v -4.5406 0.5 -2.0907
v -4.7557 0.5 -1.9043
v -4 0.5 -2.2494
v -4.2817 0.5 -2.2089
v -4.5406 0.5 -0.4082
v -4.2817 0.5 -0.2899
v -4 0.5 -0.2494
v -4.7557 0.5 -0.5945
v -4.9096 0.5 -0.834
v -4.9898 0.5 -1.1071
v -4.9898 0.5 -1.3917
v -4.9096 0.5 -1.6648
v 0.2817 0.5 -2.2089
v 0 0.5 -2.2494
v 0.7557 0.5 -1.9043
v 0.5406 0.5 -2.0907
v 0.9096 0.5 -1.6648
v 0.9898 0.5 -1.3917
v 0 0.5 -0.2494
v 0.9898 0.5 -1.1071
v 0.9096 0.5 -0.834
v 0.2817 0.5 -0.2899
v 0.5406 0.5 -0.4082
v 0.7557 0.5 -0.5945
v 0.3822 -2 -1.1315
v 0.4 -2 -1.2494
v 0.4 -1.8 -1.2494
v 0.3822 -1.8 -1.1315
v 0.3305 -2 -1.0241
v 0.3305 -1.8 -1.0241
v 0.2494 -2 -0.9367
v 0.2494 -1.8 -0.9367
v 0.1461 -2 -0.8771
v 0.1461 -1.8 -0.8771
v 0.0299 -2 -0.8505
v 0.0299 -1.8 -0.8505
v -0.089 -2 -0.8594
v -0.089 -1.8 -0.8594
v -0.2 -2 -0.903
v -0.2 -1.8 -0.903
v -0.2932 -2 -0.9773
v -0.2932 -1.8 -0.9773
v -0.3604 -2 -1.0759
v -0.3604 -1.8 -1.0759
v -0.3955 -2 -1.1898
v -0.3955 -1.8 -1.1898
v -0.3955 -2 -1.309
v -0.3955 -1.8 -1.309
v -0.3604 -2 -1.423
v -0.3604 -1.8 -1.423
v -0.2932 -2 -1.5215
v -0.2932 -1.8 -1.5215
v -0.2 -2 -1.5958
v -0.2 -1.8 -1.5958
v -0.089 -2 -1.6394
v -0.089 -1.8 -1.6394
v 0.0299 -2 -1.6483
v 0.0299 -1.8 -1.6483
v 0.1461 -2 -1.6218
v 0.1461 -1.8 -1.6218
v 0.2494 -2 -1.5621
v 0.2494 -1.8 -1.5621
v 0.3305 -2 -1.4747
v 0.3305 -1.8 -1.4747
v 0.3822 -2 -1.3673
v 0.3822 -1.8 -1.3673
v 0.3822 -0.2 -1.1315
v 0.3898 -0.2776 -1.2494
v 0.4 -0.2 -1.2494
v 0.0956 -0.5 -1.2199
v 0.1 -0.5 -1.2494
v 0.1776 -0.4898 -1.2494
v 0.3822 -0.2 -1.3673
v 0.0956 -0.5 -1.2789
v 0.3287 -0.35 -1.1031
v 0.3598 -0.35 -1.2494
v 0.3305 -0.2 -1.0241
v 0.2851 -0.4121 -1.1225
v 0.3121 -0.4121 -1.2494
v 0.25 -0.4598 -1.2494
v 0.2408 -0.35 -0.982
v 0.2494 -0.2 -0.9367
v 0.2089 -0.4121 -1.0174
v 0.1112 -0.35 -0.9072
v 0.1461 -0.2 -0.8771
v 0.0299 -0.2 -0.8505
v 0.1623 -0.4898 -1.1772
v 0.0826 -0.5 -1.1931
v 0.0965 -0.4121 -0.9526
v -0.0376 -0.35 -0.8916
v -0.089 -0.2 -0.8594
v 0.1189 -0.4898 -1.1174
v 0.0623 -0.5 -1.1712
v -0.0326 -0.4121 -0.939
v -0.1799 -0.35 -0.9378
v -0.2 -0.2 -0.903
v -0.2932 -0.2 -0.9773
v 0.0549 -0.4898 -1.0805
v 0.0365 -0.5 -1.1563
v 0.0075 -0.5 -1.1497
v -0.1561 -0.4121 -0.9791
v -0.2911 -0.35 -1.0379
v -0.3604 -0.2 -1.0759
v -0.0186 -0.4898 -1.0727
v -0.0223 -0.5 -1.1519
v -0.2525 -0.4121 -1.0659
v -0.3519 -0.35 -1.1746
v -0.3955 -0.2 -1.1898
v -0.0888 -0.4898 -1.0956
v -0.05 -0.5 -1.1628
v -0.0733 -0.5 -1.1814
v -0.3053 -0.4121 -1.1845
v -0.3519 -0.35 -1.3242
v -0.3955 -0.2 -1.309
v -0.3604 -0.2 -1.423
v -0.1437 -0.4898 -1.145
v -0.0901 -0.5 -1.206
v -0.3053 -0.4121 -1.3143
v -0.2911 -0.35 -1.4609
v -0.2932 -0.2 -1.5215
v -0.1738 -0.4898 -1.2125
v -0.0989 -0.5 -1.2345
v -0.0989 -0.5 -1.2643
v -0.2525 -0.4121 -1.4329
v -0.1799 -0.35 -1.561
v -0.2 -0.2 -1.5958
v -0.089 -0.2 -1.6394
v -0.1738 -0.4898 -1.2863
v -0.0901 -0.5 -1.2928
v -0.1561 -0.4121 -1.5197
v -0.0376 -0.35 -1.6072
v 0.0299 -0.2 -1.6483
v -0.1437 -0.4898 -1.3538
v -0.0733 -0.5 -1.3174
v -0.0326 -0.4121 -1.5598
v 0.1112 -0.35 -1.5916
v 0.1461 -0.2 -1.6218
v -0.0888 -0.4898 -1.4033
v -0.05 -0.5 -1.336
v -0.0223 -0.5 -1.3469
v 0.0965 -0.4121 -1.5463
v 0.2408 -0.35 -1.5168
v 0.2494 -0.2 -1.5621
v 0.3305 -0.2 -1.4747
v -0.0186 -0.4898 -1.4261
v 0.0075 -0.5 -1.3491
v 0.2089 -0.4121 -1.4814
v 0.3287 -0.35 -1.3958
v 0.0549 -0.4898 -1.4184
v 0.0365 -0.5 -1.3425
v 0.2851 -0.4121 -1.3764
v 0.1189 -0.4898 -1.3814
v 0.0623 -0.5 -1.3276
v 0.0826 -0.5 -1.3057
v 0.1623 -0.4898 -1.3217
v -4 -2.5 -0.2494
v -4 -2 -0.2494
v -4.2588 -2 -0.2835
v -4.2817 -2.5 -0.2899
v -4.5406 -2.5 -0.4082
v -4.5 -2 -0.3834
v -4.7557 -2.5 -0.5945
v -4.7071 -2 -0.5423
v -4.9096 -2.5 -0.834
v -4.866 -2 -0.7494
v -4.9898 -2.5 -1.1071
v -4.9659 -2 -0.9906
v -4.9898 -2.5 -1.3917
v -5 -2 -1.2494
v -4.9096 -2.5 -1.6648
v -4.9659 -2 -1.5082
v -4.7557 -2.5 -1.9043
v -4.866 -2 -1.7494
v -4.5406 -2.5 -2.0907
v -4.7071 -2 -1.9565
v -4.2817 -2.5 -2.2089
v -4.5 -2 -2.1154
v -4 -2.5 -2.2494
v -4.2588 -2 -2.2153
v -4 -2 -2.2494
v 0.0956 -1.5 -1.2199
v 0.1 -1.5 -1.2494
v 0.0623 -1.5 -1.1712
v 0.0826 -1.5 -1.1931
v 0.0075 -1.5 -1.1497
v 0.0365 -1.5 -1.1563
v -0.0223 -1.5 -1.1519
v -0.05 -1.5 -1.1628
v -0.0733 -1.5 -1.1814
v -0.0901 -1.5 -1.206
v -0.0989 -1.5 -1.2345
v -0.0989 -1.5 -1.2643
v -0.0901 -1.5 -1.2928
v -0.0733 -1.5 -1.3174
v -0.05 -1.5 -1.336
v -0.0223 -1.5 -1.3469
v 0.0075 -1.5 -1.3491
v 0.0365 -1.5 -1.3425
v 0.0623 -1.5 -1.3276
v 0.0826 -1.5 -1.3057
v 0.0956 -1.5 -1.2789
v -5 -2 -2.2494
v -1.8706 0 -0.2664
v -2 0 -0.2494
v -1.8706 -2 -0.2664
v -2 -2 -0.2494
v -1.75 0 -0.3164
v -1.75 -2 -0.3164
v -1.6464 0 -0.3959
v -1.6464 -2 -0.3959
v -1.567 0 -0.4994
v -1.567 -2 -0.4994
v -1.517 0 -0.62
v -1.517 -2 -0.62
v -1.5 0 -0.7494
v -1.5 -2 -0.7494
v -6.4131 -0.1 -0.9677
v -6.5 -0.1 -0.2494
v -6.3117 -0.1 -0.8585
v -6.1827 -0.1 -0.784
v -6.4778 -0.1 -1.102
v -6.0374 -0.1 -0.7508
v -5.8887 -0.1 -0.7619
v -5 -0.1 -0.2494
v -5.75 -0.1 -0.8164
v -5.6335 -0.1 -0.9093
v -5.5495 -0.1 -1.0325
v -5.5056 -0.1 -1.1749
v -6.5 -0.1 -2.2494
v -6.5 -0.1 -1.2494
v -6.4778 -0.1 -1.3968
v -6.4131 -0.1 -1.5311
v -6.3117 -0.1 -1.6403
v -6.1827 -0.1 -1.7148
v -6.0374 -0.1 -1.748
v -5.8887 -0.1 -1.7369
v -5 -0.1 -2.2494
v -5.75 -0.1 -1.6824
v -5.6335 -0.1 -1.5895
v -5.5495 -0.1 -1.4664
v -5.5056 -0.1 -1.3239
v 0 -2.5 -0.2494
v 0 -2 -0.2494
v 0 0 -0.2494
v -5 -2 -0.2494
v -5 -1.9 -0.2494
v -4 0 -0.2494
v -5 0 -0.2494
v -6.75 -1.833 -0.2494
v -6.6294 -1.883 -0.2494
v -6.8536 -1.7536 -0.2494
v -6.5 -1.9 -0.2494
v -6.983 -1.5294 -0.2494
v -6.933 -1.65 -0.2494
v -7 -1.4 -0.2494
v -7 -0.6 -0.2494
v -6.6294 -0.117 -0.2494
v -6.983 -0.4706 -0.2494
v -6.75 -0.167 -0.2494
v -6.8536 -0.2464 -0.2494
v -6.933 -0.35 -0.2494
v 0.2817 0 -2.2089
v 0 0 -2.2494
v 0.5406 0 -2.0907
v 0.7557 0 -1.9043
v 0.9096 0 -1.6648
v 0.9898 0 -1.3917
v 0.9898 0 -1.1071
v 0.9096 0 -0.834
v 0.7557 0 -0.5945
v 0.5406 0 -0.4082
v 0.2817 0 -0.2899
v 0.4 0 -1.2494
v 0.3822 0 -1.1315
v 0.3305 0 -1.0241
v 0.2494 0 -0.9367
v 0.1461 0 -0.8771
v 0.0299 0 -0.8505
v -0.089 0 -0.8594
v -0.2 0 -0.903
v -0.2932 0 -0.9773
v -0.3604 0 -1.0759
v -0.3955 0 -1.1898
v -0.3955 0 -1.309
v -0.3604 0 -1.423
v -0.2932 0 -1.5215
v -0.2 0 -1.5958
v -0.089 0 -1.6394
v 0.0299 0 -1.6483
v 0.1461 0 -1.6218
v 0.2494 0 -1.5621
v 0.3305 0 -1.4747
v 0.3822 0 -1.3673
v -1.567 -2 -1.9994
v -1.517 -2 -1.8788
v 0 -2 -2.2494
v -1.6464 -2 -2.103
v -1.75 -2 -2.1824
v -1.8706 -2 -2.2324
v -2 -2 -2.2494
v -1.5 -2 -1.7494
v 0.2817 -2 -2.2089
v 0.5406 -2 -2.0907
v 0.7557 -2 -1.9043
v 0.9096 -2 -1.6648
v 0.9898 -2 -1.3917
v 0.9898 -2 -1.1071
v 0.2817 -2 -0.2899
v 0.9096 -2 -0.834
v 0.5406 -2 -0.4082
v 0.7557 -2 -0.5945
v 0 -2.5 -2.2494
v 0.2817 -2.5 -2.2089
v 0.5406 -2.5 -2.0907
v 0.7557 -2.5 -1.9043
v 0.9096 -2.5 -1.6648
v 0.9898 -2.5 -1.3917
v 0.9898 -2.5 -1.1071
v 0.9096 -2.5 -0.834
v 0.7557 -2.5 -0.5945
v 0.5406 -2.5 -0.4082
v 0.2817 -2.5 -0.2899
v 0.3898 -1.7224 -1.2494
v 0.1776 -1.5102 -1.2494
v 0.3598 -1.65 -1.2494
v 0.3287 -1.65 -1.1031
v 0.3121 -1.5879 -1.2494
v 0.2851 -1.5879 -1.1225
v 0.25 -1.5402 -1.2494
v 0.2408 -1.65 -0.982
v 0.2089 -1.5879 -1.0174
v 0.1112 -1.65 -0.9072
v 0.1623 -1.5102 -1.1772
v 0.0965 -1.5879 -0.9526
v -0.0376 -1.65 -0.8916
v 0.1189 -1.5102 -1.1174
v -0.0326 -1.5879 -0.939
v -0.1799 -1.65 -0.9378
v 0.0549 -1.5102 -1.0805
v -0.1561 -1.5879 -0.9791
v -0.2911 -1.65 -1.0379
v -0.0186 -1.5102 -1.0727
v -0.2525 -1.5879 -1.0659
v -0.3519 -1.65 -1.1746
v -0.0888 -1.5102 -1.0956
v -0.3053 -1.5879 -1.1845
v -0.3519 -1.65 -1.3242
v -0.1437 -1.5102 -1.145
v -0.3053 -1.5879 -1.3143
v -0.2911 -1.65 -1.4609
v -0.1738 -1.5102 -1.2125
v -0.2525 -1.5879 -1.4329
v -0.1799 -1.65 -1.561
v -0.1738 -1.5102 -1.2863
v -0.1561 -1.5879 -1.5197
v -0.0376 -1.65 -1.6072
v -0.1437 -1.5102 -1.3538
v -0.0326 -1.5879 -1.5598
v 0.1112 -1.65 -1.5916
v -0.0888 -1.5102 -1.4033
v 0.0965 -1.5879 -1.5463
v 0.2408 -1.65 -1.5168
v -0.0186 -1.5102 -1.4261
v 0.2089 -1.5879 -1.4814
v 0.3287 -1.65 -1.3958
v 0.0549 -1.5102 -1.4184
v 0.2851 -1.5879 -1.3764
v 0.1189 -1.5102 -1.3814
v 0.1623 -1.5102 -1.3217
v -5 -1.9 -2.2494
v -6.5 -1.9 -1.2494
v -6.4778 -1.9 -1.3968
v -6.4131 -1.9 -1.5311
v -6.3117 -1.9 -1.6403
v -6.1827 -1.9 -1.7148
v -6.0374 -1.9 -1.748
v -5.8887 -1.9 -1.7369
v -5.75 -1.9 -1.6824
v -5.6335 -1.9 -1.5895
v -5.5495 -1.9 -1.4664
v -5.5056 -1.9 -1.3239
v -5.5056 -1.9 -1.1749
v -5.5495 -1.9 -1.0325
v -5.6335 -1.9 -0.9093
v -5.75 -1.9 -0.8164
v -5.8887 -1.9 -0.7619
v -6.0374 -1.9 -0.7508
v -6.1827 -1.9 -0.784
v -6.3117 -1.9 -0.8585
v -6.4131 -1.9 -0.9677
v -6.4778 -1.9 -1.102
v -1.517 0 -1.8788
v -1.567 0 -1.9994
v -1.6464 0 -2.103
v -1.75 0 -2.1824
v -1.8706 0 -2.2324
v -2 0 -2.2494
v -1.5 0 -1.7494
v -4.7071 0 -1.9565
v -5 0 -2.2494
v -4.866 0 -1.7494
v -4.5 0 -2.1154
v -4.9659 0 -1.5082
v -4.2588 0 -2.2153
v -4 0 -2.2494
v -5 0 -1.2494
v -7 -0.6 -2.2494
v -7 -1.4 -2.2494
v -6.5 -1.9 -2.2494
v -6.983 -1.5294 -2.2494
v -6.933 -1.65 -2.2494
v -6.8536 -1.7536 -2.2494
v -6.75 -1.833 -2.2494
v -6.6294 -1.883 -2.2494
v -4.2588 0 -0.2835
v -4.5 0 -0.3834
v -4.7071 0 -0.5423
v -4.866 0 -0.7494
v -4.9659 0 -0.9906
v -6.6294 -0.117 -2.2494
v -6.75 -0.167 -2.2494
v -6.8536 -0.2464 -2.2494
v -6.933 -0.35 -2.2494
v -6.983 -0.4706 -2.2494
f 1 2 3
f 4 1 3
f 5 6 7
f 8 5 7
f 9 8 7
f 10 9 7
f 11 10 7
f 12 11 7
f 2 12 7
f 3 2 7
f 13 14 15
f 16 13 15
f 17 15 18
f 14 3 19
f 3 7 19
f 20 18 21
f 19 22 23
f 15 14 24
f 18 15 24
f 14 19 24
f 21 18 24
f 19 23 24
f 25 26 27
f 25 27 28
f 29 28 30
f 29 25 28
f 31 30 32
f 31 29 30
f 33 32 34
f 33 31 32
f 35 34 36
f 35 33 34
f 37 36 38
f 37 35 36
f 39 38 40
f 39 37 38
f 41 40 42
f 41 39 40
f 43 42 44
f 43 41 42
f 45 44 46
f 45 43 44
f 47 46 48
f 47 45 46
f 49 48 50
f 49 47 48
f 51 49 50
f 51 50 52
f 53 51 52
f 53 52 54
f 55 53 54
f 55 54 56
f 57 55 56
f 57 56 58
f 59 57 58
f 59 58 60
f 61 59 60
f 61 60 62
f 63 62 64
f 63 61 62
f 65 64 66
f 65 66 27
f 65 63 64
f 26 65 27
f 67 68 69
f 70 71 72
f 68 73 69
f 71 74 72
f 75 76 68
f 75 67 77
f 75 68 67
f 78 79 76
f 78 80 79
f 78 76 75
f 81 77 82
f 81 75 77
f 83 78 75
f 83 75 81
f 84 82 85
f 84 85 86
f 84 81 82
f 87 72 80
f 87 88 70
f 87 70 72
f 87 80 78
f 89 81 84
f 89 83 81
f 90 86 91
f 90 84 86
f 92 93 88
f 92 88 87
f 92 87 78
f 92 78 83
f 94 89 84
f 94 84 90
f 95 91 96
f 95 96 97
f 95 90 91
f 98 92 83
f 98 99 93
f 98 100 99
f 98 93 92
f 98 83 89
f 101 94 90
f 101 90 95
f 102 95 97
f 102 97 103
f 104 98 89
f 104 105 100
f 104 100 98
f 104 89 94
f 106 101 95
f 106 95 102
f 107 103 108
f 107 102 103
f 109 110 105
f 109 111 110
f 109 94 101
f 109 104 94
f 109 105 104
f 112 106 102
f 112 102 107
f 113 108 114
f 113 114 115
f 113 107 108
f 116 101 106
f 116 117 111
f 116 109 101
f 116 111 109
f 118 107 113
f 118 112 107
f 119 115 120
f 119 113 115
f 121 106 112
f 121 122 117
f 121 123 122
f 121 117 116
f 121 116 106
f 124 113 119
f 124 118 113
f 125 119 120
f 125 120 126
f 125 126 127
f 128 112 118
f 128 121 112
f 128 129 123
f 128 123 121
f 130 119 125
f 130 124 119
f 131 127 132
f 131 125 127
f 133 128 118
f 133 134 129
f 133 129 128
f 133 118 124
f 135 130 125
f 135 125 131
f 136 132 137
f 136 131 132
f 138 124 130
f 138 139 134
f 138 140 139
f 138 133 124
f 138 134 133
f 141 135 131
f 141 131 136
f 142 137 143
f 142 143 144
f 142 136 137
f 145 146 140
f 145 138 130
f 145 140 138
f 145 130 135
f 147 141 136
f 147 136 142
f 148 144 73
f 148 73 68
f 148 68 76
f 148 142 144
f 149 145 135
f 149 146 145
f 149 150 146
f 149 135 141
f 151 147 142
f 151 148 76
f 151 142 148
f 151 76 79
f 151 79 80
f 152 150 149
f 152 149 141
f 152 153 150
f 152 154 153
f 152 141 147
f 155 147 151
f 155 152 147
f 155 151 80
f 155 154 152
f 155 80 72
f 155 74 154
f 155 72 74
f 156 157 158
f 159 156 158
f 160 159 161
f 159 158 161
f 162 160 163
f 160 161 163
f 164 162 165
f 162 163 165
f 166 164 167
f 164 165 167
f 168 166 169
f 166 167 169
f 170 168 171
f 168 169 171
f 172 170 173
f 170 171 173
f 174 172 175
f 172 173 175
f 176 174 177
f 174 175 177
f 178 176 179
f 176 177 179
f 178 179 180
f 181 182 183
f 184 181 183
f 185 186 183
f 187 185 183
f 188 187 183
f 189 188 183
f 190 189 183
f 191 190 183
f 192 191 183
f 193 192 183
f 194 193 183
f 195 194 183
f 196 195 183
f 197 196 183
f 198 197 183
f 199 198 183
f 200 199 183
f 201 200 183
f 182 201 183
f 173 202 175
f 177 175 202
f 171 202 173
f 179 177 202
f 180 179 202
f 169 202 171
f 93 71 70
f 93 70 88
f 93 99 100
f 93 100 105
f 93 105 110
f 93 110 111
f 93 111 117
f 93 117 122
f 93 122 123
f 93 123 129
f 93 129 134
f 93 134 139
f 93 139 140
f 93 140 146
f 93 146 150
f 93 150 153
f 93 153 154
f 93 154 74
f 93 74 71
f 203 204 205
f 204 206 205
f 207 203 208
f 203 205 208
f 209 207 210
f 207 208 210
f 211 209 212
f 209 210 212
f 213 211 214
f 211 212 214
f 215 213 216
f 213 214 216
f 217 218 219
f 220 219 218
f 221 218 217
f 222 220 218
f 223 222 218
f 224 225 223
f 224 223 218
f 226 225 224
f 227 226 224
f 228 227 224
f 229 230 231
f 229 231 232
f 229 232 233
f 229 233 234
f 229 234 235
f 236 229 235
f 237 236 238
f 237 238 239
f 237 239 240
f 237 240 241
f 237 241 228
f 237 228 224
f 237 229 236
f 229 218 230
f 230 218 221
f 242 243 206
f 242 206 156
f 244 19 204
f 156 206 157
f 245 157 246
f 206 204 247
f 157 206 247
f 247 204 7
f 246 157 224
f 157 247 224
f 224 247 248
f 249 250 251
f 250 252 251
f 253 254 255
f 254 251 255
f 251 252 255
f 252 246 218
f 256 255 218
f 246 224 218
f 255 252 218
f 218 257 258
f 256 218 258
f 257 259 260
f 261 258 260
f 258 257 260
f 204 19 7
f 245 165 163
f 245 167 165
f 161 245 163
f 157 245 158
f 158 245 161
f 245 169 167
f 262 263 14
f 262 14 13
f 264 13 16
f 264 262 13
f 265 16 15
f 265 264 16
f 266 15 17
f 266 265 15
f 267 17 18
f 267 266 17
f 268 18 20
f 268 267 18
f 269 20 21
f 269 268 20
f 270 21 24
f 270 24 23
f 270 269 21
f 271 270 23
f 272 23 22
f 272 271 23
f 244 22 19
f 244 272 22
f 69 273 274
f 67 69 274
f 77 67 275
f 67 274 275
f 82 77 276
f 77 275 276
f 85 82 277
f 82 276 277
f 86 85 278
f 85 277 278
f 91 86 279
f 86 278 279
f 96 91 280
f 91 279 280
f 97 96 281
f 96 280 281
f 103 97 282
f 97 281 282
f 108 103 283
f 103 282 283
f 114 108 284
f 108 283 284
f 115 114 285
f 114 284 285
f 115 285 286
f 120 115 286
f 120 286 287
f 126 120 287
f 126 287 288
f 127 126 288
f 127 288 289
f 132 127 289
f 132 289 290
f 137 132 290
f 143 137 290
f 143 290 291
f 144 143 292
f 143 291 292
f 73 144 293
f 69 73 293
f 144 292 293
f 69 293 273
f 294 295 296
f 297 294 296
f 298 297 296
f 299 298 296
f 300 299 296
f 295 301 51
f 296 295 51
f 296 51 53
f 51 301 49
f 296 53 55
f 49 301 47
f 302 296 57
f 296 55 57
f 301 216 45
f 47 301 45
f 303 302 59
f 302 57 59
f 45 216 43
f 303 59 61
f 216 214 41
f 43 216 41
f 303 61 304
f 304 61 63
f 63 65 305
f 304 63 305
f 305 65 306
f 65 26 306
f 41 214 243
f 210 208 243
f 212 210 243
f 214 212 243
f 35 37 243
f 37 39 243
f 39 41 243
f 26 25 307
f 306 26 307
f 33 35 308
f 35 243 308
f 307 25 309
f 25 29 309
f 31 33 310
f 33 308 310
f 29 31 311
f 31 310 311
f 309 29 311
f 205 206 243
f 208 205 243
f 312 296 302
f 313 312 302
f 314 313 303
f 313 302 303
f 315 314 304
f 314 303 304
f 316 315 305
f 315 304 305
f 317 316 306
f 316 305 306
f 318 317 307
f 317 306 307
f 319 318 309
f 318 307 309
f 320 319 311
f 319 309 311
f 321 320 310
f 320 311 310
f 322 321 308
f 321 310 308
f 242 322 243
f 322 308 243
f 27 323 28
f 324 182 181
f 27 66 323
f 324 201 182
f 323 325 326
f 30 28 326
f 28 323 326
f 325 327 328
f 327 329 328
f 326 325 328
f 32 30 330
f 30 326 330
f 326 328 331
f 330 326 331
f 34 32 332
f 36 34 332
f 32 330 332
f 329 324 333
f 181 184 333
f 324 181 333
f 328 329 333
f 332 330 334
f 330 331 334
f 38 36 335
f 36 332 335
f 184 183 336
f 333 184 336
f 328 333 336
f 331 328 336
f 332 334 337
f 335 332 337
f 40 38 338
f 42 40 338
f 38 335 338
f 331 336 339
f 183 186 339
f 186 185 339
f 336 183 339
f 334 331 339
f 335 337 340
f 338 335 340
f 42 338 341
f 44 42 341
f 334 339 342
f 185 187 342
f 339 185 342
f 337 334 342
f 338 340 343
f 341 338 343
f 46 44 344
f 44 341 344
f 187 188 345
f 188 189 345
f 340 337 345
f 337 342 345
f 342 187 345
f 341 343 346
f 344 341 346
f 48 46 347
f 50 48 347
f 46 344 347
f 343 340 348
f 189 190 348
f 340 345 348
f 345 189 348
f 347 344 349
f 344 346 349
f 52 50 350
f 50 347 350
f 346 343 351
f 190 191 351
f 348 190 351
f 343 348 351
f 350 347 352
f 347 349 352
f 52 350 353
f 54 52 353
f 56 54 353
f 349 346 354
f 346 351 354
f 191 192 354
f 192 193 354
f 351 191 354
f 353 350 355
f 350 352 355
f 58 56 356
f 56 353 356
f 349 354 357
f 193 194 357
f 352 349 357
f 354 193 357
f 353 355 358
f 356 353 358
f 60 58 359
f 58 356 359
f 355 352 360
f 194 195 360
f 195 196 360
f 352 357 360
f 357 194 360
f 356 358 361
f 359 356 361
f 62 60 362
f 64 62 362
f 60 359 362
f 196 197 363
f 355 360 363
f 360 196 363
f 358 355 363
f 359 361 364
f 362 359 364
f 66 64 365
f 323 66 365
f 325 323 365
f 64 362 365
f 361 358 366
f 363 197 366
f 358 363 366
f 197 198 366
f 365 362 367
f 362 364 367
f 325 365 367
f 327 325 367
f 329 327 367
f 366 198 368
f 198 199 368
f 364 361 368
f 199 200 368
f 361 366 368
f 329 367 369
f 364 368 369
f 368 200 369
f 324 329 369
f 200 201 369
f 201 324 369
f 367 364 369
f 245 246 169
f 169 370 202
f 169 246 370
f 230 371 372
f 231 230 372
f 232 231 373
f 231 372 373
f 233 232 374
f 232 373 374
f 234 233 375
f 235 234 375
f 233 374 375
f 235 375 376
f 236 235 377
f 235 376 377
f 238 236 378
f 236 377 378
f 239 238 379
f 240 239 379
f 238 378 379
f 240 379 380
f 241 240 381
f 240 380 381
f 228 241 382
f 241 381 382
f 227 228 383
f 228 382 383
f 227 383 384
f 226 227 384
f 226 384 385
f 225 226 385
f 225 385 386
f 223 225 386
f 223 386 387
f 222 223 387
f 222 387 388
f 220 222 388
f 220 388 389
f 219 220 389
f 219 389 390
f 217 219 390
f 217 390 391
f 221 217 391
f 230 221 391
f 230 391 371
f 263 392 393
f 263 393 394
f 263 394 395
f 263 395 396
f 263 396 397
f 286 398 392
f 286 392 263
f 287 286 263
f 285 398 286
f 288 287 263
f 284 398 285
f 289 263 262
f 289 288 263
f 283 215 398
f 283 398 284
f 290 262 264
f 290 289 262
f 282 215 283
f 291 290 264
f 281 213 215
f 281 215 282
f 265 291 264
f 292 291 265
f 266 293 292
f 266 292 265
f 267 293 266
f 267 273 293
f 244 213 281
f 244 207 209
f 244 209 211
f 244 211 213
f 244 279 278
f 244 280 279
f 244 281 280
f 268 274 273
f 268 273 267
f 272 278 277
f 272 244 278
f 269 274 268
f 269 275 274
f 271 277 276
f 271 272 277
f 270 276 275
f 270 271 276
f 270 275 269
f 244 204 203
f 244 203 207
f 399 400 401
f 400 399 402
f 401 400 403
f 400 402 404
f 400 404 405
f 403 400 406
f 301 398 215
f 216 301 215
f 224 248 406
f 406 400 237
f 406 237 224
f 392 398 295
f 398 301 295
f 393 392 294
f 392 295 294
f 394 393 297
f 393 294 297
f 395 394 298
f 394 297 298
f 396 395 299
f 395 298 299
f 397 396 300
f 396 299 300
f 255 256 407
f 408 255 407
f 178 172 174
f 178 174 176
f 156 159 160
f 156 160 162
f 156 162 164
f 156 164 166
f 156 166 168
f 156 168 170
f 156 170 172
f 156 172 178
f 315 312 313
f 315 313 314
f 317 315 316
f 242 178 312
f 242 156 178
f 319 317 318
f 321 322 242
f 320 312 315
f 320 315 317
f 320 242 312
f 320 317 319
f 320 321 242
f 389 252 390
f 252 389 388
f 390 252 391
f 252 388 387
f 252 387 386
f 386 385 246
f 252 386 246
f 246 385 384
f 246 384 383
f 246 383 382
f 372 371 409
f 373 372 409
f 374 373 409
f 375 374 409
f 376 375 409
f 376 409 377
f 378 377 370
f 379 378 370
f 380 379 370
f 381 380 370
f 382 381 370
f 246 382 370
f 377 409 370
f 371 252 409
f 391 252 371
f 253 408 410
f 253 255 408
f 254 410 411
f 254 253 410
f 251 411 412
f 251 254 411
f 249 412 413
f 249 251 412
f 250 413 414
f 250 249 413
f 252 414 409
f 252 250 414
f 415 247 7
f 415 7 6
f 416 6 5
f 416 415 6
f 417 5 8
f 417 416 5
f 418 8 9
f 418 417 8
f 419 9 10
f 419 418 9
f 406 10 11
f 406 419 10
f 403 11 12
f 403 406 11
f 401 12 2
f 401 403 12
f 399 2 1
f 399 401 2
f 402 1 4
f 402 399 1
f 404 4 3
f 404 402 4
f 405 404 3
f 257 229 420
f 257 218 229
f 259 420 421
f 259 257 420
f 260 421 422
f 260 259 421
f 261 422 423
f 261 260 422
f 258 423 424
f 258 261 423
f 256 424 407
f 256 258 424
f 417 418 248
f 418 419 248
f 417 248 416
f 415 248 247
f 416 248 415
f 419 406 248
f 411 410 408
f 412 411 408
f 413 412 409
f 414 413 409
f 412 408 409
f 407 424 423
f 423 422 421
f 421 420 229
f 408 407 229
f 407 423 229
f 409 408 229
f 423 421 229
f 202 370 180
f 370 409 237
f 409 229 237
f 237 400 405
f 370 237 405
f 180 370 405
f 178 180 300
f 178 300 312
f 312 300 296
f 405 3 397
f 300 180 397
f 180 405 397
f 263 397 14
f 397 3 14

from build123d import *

# Parameters (mm, degrees)
F0_R      = 0.5
F1_DEPTH  = 2
F0_R_2    = 0.4
F2_DEPTH  = 0.5
F3_R      = 0.4
F4_DEPTH  = 0.5
F5_D      = 1
F6_DEPTH  = 0.5
F7_DEPTH  = 0.5
F8_R      = 0.3
F9_W      = 2
F9_H      = 0.1
F10_DEPTH = 25
F11_R     = 0.49999


# Not quite as in the source:
# - a fillet or chamfer is up to 0.001 mm smaller than in the source, because OpenCascade refuses the exact size
# - a feature names something its author has since deleted; it is built from what else it names


with BuildPart() as f1:
    # F0 (on Front) → F1 (new body)
    with BuildSketch(Plane.XZ):
        with BuildLine():
            Line((-1.5, -1.2454767711), (-1.5, -0.24940907))
            Line((-1.5, -0.24940907), (-4, -0.24940907))
            ThreePointArc((-4, -0.24940907), (-5, -1.24940907), (-4, -2.24940907))
            Line((-4, -2.24940907), (-1.5, -2.24940907))
            Line((-1.5, -2.24940907), (-1.5, -1.2454767711))
        make_face()
        with BuildLine():
            ThreePointArc((-4, -2.24940907), (-5, -1.24940907), (-4, -0.24940907))
            Line((-4, -0.24940907), (-7, -0.24940907))
            Line((-7, -0.24940907), (-7, -2.24940907))
            Line((-7, -2.24940907), (-4, -2.24940907))
        make_face()
        with Locations((-6, -1.24940907)):
            Circle(F0_R, mode=Mode.SUBTRACT)
        with Locations((-6, -1.24940907)):
            Circle(F0_R)
    extrude(amount=F1_DEPTH)

    # F0 (on Front) → F2 (join)
    with BuildSketch(Plane.XZ):
        with BuildLine():
            Line((-1.5, -1.2454767711), (-1.5, -0.24940907))
            Line((-1.5, -0.24940907), (-4, -0.24940907))
            ThreePointArc((-4, -0.24940907), (-5, -1.24940907), (-4, -2.24940907))
            Line((-4, -2.24940907), (-1.5, -2.24940907))
            Line((-1.5, -2.24940907), (-1.5, -1.2454767711))
        make_face()
        with BuildLine():
            Line((0, -0.24940907), (-1, -0.24940907))
            Line((-1, -0.24940907), (-1, -2.24940907))
            Line((-1, -2.24940907), (0, -2.24940907))
            ThreePointArc((0, -2.24940907), (1, -1.24940907), (0, -0.24940907))
        make_face()
        with Locations((0, -1.24940907)):
            Circle(F0_R_2, mode=Mode.SUBTRACT)
        Polygon((-1, -2.24940907), (-1, -0.24940907), (-1.5, -0.24940907), (-1.5, -1.2454767711), (-1.5, -2.24940907), align=None)
        with Locations((0, -1.24940907)):
            Circle(F0_R_2)
    extrude(amount=-F2_DEPTH)

    # F3 (on face) → F4 (join)
    with BuildSketch(Plane.XZ.offset(2)):
        with BuildLine():
            Line((-1.5, -2.24940907), (-1.5, -0.24940907))
            Line((-1.5, -0.24940907), (-4, -0.24940907))
            ThreePointArc((-4, -0.24940907), (-5, -1.24940907), (-4, -2.24940907))
            Line((-4, -2.24940907), (-1.5, -2.24940907))
        make_face()
        with BuildLine():
            Line((0, -0.24940907), (-1, -0.24940907))
            Line((-1, -0.24940907), (-1.5, -0.24940907))
            Line((-1.5, -0.24940907), (-1.5, -2.24940907))
            Line((-1.5, -2.24940907), (0, -2.24940907))
            ThreePointArc((0, -2.24940907), (1, -1.24940907), (0, -0.24940907))
        make_face()
        with Locations((0, -1.24940907)):
            Circle(F3_R, mode=Mode.SUBTRACT)
        with Locations((0, -1.24940907)):
            Circle(F3_R)
    extrude(amount=F4_DEPTH)

    # F5 (through all)
    with Locations(Plane(origin=(0, 0, 0), x_dir=(1, 0, 0), z_dir=(0, 1, 0))):
        with Locations((-6, 1.24940907)):
            Hole(F5_D / 2)

    # F0 (on Front) → F6 (join)
    with BuildSketch(Plane.XZ):
        with Locations((0, -1.24940907)):
            Circle(F0_R_2)
    extrude(amount=F6_DEPTH)

    # F3 (on face) → F7 (join)
    with BuildSketch(Plane.XZ.offset(2)):
        with Locations((0, -1.24940907)):
            Circle(F3_R)
    extrude(amount=-F7_DEPTH)

    # F8
    f8_edges = [f1.edges().sort_by_distance(p)[0] for p in [
        (-0.4, -0.5, -1.249409),
        (-0.4, -1.5, -1.249409),
    ]]
    fillet(f8_edges, radius=F8_R)

    # F9 (on face) → F10 (cut)
    with BuildSketch(Plane(origin=(0, 0, -2.24940907), x_dir=(1, 0, 0), z_dir=(0, 0, -1))):
        with Locations((-6, 1.95)):
            Rectangle(F9_W, F9_H)
        with Locations((-6, 0.05)):
            Rectangle(F9_W, F9_H)
    extrude(amount=-F10_DEPTH, mode=Mode.SUBTRACT)

    # F11 (radius 0.5 in the source; OpenCascade refuses exactly that, so slightly less here)
    f11_edges = [f1.edges().sort_by_distance(p)[0] for p in [
        (-7, -1.9, -1.249409),
        (-7, -0.1, -1.249409),
        (-1.5, -1, -0.249409),
        (-1.5, -1, -2.249409),
    ]]
    fillet(f11_edges, radius=F11_R)


solid = f1.part
